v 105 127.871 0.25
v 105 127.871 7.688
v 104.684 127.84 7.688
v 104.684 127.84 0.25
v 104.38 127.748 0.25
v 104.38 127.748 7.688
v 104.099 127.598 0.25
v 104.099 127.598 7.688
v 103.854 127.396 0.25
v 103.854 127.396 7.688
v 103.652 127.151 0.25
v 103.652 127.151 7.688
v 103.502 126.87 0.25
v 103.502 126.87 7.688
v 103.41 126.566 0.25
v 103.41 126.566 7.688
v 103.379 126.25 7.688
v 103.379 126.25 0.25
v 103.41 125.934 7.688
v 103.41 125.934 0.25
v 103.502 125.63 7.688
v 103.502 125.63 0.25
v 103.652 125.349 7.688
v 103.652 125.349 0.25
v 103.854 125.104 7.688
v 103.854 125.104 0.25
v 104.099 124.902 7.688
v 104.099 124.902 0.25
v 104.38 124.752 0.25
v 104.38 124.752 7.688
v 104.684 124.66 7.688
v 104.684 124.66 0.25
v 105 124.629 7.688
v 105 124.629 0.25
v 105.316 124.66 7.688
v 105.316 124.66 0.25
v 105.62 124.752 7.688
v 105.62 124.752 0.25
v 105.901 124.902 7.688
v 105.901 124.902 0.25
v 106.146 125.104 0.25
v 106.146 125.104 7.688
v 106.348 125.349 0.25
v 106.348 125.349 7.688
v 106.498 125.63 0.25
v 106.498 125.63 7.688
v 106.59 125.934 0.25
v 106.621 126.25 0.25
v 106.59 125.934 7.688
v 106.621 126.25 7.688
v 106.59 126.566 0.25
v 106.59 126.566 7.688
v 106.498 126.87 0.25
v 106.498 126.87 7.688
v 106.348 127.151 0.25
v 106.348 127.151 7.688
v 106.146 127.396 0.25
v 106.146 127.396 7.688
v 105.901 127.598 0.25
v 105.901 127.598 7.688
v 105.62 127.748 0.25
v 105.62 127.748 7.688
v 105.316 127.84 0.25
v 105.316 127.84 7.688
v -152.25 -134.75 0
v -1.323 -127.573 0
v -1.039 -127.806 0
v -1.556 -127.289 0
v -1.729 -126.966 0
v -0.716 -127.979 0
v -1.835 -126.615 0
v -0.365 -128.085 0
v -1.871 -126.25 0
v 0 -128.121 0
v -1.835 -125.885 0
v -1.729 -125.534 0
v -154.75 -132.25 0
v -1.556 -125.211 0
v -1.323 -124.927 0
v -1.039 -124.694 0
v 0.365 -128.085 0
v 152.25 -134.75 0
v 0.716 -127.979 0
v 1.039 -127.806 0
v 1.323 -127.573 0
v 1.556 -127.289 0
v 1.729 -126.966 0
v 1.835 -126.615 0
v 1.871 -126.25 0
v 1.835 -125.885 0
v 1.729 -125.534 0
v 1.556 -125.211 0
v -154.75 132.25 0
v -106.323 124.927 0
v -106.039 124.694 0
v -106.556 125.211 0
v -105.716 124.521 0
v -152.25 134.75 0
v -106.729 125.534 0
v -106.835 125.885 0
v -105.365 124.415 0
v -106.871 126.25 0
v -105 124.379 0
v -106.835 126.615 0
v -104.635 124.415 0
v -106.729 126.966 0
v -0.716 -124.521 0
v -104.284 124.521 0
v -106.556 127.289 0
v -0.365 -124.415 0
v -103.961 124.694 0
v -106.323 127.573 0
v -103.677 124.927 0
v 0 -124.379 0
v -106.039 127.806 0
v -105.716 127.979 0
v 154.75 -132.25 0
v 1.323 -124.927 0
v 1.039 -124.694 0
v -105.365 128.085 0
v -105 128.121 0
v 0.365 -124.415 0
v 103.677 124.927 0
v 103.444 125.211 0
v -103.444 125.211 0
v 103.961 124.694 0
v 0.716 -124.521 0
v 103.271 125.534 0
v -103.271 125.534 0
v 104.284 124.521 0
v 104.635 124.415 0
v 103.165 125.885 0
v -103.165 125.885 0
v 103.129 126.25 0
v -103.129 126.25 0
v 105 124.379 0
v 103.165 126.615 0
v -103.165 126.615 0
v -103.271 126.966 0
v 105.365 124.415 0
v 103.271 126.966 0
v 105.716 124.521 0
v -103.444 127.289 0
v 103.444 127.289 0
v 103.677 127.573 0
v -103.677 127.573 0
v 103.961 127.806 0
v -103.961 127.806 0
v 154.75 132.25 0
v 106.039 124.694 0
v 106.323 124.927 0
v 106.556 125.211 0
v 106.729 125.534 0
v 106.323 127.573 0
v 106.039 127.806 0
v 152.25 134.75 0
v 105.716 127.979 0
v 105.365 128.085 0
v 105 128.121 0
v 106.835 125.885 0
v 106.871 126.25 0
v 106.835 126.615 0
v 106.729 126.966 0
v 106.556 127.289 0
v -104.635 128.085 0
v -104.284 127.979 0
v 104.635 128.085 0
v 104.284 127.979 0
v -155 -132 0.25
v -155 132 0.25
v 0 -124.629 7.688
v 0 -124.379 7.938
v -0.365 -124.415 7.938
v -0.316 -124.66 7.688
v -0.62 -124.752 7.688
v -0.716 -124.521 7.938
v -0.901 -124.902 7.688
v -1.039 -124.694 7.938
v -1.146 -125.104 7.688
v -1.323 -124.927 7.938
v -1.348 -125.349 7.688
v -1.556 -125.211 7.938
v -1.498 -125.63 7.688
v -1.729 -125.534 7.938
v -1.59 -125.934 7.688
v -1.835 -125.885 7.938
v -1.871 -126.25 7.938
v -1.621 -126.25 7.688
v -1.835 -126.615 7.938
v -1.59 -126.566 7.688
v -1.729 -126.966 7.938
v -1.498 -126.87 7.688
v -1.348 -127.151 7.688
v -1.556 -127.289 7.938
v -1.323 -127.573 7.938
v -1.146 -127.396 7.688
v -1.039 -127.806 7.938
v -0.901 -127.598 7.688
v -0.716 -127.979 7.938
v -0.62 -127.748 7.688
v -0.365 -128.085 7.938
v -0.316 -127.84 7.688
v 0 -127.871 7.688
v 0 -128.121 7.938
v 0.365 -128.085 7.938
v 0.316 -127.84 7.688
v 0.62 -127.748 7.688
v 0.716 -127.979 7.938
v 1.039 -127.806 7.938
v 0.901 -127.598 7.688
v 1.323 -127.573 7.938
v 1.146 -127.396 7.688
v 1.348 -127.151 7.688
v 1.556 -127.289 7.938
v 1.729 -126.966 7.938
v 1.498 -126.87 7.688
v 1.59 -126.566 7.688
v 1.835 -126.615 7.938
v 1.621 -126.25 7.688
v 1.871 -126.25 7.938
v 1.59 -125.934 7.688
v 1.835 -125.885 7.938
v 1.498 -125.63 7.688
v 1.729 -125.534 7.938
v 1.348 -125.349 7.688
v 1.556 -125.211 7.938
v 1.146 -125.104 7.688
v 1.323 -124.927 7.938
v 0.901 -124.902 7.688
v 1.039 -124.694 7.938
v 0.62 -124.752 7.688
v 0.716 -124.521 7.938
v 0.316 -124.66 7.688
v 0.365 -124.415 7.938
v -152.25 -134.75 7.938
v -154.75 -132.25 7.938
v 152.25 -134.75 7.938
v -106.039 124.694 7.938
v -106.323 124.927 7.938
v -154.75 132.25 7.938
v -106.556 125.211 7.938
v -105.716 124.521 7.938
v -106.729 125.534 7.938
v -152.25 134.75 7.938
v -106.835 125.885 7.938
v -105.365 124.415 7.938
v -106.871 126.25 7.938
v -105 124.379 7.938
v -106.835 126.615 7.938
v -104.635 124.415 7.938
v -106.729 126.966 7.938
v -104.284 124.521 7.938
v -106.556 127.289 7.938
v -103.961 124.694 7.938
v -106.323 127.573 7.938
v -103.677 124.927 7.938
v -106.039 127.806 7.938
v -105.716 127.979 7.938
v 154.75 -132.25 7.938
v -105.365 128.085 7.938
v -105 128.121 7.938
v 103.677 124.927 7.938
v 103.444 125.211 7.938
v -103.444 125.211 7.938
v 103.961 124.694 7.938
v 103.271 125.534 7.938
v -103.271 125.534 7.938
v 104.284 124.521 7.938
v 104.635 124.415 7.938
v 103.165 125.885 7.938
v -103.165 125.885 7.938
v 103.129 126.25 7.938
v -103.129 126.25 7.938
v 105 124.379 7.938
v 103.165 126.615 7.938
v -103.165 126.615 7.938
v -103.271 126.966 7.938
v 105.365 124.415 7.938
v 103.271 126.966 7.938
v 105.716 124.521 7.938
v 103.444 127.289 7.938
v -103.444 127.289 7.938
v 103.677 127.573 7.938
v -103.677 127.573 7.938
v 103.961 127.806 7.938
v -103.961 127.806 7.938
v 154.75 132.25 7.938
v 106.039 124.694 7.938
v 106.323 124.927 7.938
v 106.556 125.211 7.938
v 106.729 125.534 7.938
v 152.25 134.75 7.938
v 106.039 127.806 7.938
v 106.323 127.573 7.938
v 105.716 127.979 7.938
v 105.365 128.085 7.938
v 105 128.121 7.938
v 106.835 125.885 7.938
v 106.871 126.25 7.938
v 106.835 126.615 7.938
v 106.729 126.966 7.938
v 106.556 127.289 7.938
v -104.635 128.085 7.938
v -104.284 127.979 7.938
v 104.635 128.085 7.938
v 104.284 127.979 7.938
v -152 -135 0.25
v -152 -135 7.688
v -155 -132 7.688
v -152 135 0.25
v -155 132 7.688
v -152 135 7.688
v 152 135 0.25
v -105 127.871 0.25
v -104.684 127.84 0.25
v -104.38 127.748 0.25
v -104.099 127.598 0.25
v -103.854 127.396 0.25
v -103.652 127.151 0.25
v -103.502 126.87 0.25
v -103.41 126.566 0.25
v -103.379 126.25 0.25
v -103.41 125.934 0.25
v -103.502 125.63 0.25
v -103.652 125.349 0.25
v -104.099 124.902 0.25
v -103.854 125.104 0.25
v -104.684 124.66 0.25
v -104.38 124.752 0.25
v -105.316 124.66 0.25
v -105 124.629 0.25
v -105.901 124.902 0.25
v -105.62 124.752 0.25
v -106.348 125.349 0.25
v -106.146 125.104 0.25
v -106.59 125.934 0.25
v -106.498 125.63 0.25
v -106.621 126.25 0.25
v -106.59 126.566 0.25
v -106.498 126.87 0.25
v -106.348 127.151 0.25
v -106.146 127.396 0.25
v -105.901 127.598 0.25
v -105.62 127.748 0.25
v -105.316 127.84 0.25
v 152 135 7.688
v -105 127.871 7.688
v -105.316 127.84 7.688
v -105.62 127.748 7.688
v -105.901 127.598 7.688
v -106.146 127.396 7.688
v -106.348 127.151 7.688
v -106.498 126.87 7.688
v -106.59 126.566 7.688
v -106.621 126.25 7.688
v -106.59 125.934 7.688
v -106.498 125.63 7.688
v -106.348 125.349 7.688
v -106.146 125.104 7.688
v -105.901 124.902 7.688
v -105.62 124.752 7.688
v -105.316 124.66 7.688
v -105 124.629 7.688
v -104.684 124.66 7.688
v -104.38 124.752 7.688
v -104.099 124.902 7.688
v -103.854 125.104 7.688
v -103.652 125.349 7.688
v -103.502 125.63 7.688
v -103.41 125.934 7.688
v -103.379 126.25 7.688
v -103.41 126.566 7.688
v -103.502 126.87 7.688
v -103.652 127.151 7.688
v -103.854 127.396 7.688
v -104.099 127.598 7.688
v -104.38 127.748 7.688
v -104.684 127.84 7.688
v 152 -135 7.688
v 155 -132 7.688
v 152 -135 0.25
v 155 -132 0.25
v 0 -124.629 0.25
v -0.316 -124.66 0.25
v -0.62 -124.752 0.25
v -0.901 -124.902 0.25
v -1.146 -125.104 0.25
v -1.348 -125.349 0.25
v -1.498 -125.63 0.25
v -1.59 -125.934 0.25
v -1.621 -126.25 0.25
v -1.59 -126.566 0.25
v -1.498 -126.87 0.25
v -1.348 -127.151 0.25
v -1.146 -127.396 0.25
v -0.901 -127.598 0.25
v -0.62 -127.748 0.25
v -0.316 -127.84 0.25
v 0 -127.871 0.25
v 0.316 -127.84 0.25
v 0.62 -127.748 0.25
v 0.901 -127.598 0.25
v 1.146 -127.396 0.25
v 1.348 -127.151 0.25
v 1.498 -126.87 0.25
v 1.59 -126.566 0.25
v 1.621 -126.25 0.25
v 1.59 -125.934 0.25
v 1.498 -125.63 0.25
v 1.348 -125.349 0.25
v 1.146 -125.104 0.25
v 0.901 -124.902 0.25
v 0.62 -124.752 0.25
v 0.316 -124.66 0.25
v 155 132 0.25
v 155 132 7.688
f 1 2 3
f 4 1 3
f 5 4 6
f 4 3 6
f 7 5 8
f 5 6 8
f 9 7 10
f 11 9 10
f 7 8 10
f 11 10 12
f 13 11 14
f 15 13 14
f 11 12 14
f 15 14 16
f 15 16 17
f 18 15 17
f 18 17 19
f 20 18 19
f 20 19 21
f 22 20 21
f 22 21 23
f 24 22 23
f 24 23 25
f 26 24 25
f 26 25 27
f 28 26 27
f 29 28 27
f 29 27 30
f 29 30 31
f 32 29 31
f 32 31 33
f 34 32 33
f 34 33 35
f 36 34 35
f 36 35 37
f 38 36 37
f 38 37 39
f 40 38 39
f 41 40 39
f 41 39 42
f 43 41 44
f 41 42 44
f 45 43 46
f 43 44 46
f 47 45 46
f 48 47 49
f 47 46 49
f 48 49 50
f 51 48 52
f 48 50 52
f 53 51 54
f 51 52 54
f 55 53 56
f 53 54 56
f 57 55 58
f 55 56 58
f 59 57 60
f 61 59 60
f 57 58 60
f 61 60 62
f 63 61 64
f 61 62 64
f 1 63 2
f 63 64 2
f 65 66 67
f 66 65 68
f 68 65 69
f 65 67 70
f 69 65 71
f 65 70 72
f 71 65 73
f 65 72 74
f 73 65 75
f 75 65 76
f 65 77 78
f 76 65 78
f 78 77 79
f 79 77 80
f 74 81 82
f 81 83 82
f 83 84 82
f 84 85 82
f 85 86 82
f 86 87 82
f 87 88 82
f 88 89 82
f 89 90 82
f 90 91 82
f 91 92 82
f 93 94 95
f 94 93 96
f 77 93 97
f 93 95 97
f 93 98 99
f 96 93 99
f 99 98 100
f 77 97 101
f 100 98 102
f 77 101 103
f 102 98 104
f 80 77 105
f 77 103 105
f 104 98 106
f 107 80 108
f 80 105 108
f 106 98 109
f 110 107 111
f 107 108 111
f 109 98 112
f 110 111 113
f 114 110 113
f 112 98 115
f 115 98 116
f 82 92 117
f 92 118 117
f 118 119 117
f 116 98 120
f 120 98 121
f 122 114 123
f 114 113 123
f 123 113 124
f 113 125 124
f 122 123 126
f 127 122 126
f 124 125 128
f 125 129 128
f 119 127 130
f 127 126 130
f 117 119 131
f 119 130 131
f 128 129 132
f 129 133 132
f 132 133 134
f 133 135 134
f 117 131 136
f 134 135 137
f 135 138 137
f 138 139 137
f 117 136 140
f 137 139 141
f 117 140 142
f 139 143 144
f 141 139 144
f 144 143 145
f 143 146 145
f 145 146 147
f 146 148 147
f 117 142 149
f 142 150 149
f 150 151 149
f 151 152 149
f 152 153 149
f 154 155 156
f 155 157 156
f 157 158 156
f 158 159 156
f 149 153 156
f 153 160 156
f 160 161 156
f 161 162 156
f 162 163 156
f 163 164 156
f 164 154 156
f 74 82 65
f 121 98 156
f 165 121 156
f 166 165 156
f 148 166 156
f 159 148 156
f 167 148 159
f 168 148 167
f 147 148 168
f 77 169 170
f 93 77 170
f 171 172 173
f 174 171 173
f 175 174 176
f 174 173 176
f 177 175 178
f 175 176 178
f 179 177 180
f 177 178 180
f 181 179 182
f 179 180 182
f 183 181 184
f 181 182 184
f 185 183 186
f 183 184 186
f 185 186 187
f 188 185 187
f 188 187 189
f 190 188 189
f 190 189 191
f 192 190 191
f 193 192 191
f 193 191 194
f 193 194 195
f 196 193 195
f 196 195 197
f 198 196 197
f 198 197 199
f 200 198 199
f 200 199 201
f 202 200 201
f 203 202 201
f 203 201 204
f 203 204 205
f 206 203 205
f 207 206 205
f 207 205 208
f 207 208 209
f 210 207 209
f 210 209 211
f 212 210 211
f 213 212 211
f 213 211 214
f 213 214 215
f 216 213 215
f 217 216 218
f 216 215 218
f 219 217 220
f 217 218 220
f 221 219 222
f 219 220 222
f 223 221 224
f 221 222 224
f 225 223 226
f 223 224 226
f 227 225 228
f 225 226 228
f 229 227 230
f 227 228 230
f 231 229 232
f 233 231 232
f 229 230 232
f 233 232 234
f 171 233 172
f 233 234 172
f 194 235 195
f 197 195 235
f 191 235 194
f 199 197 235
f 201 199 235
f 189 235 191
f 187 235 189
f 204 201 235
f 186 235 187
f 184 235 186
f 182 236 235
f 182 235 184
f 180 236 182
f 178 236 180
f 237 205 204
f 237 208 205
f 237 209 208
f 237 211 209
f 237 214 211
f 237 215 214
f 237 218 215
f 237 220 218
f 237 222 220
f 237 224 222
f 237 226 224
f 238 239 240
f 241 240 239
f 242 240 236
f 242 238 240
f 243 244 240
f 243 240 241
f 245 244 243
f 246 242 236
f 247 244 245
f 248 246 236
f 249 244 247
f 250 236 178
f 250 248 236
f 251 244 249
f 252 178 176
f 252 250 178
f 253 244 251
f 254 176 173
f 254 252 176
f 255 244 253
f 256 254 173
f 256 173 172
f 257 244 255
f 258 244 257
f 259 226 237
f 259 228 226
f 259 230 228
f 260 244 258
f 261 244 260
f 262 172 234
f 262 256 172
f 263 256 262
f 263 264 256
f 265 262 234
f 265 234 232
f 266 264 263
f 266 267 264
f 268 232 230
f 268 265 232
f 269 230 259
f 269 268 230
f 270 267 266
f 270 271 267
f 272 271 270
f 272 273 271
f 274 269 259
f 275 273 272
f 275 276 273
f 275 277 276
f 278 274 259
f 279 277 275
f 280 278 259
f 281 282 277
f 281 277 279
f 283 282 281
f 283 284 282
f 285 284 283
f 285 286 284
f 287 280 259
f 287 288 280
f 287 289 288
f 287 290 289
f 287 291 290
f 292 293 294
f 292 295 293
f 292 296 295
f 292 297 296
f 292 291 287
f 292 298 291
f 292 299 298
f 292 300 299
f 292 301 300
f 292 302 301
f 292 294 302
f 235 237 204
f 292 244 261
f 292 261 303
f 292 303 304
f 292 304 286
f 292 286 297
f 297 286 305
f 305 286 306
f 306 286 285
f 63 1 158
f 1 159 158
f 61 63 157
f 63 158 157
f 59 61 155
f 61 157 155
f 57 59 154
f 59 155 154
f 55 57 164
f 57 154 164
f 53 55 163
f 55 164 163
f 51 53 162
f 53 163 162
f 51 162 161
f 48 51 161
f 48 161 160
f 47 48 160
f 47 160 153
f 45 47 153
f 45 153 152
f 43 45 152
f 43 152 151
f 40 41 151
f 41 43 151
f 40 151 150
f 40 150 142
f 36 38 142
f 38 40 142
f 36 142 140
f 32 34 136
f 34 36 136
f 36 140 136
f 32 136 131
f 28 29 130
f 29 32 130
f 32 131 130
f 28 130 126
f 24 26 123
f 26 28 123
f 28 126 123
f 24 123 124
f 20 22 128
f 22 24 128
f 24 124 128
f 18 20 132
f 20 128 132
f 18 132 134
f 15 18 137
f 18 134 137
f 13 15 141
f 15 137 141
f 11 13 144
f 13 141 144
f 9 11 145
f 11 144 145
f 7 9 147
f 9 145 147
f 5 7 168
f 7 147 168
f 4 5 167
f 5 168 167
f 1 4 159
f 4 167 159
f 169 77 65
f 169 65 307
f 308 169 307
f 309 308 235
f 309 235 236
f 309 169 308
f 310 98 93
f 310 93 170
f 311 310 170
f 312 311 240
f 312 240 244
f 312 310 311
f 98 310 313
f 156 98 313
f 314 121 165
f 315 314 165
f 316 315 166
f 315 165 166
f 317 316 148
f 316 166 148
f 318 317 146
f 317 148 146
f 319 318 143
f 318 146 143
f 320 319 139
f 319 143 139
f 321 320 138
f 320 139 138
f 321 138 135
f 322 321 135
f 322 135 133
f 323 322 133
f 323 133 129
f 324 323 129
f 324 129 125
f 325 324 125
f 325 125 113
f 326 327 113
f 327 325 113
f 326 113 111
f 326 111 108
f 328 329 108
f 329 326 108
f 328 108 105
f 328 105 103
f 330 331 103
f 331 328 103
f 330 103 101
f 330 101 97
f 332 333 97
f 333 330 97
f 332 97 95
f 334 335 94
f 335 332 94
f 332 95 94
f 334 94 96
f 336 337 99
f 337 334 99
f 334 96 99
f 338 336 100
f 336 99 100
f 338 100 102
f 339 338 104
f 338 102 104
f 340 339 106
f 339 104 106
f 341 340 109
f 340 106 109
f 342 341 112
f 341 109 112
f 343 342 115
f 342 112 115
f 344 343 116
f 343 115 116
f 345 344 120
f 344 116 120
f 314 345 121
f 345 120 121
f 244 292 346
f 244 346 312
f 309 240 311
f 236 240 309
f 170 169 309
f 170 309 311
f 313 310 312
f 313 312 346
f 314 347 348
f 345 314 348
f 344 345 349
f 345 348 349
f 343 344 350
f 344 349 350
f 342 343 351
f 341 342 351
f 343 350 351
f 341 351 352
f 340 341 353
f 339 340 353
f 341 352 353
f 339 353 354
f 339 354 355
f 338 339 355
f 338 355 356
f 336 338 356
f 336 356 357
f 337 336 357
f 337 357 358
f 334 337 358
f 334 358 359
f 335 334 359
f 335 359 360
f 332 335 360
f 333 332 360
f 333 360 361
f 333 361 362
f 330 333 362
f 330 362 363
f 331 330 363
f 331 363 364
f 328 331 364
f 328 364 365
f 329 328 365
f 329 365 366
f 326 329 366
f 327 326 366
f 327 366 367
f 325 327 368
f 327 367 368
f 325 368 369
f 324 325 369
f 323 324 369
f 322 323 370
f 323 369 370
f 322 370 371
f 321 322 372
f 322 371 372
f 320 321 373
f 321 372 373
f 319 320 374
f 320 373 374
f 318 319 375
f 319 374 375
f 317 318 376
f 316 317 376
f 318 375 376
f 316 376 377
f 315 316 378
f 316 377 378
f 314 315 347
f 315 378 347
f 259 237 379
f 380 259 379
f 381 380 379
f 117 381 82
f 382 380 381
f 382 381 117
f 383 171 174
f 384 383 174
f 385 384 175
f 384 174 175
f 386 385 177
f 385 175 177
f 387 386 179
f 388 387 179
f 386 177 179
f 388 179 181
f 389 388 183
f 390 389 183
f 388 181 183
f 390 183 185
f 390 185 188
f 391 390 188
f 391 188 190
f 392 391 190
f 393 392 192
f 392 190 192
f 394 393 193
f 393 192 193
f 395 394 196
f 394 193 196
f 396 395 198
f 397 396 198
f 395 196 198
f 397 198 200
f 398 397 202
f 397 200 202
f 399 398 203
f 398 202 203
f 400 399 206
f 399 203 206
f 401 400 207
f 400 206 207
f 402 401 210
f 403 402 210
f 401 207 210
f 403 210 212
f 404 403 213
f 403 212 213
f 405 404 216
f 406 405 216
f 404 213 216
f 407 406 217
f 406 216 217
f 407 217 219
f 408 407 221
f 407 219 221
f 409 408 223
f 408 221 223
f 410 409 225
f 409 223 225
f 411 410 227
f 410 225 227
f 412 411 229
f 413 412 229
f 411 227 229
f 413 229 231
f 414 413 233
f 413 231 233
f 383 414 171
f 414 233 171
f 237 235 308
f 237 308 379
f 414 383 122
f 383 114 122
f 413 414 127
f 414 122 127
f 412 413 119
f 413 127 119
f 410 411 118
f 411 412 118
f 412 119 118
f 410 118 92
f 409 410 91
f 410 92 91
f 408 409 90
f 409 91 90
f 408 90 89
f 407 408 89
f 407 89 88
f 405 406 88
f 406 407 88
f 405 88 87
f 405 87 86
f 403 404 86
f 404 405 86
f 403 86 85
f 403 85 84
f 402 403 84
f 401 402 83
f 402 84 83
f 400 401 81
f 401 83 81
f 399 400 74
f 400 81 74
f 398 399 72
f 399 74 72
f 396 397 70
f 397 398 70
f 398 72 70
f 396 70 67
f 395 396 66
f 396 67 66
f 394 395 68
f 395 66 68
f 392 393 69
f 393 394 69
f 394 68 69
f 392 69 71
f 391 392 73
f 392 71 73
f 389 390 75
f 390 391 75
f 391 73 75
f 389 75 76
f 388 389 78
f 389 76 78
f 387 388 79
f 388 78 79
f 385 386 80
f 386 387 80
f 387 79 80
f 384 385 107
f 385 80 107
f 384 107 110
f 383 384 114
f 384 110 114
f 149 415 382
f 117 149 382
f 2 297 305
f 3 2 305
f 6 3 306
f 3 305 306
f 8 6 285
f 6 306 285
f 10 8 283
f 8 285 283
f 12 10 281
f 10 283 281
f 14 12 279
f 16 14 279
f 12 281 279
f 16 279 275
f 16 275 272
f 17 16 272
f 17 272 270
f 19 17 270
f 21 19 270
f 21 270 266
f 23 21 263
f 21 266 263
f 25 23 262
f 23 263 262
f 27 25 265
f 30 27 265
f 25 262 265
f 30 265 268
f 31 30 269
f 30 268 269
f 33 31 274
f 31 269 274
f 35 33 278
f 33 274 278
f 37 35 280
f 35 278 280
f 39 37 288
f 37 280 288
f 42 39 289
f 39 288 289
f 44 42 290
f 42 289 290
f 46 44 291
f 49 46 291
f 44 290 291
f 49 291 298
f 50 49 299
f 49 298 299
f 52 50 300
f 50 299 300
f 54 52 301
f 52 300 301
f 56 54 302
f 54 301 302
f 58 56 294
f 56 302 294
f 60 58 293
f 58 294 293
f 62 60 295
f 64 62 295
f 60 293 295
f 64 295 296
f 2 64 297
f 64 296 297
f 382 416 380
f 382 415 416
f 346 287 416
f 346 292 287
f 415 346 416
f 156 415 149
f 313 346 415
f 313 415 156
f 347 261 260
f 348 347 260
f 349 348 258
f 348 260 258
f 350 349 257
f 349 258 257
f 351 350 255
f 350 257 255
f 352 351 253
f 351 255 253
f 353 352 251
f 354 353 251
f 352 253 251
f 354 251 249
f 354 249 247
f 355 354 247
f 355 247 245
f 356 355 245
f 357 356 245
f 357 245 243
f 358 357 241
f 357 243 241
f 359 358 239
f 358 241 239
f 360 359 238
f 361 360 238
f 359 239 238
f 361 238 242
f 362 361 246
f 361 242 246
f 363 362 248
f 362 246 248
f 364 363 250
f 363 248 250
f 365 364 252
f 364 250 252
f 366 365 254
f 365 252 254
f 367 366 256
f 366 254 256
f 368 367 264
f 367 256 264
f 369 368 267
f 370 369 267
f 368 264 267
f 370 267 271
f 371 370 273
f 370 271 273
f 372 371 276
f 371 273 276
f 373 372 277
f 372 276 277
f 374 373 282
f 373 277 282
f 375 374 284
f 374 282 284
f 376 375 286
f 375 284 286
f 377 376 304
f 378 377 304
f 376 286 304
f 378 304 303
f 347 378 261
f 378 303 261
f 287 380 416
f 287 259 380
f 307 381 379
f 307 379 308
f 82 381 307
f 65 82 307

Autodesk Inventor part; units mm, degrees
ref_plane "YZ Plane" through (0, 0, 0) normal (1, 0, 0) x (0, 1, 0)
ref_plane "XZ Plane" through (0, 0, 0) normal (0, 1, 0) x (-1, 0, 0)
ref_plane "XY Plane" through (0, 0, 0) normal (0, 0, 1) x (1, 0, 0)
sketch "Sketch1" plane through (0, 0, 0) normal (0, 0, 1) x (1, 0, 0)
  line L0 (155, -135) -> (-155, -135)
  line L1 (-155, -135) -> (-155, 135)
  line L2 (-155, 135) -> (155, 135)
  line L3 (155, 135) -> (155, -135)
  line L4 (155, -135) -> (-155, 135) construction
  line L5 (-155, -135) -> (155, 135) construction
  line L6 (152.5, -117.5) -> (-152.5, -117.5) construction
  line L7 (-152.5, -117.5) -> (-152.5, 117.5) construction
  line L8 (-152.5, 117.5) -> (152.5, 117.5) construction
  line L9 (152.5, 117.5) -> (152.5, -117.5) construction
  line L10 (152.5, -117.5) -> (-152.5, 117.5) construction
  line L11 (-152.5, -117.5) -> (152.5, 117.5) construction
  circle A0 centre (0, -126.25) radius 8 construction
  circle A1 centre (0, -126.25) radius 4 construction
  line L12 (0, -117.5) -> (0, -135) construction
  line L13 (0, 135) -> (0, 117.5) construction
  line L14 (-105, 126.25) -> (105, 126.25) construction
  circle A2 centre (-105, 126.25) radius 8 construction
  circle A3 centre (105, 126.25) radius 8 construction
  circle A4 centre (105, 126.25) radius 4 construction
  circle A5 centre (-105, 126.25) radius 4 construction
  line L15 (150, -130) -> (-150, -130) construction
  line L16 (-150, -130) -> (-150, 120) construction
  line L17 (-150, 120) -> (150, 120) construction
  line L18 (150, 120) -> (150, -130) construction
  line L19 (150, -130) -> (-150, 120) construction
  line L20 (-150, -130) -> (150, 120) construction
  point P0 (0, 0)
  point P1 (0, -126.25)
  point P2 (0, 126.25)
  point P3 (0, -5)
  dimension "d0" = 310
  dimension "d1" = 270
  dimension "d2" = 305
  dimension "d3" = 235
  dimension "d4" = 16
  dimension "d5" = 8
  dimension "d6" = 210
  dimension "d7" = 300
  dimension "d8" = 250
  dimension "d9" = 5
  dimension "d10" = 5
extrude "Extrusion1" add sketch "Sketch1" along normal blind 7.9375
hole "Hole1" at (0, -126.25, 0) at (105, 126.25, 0) at (-105, 126.25, 0) direction (0, 0, 1) diameter 3.242 end through all thread size "M4x0.7" class "6H" standard "ANSI Metric M Profile"
chamfer "Chamfer3" distance 0.25 angle 45 6 edges at (0, -127.871, 0) (-105, 124.629, 0) (105, 124.629, 0) (0, -127.871, 7.9375) (-105, 124.629, 7.9375) (105, 124.629, 7.9375)
chamfer "Chamfer1" distance 3 angle 45 4 edges at (-155, 135, 3.9688) (155, 135, 3.9688) (155, -135, 3.9688) (-155, -135, 3.9688)
chamfer "Chamfer2" distance 0.25 angle 45 8 edges at (-155, 0, 7.9375) (0, 135, 7.9375) (155, 0, 7.9375) (0, -135, 7.9375) (-155, 0, 0) (0, -135, 0) (155, 0, 0) (0, 135, 0)
equation "\"d10\" = d9"
properties part number "Print Bed R2" material "Aluminum 6061"
